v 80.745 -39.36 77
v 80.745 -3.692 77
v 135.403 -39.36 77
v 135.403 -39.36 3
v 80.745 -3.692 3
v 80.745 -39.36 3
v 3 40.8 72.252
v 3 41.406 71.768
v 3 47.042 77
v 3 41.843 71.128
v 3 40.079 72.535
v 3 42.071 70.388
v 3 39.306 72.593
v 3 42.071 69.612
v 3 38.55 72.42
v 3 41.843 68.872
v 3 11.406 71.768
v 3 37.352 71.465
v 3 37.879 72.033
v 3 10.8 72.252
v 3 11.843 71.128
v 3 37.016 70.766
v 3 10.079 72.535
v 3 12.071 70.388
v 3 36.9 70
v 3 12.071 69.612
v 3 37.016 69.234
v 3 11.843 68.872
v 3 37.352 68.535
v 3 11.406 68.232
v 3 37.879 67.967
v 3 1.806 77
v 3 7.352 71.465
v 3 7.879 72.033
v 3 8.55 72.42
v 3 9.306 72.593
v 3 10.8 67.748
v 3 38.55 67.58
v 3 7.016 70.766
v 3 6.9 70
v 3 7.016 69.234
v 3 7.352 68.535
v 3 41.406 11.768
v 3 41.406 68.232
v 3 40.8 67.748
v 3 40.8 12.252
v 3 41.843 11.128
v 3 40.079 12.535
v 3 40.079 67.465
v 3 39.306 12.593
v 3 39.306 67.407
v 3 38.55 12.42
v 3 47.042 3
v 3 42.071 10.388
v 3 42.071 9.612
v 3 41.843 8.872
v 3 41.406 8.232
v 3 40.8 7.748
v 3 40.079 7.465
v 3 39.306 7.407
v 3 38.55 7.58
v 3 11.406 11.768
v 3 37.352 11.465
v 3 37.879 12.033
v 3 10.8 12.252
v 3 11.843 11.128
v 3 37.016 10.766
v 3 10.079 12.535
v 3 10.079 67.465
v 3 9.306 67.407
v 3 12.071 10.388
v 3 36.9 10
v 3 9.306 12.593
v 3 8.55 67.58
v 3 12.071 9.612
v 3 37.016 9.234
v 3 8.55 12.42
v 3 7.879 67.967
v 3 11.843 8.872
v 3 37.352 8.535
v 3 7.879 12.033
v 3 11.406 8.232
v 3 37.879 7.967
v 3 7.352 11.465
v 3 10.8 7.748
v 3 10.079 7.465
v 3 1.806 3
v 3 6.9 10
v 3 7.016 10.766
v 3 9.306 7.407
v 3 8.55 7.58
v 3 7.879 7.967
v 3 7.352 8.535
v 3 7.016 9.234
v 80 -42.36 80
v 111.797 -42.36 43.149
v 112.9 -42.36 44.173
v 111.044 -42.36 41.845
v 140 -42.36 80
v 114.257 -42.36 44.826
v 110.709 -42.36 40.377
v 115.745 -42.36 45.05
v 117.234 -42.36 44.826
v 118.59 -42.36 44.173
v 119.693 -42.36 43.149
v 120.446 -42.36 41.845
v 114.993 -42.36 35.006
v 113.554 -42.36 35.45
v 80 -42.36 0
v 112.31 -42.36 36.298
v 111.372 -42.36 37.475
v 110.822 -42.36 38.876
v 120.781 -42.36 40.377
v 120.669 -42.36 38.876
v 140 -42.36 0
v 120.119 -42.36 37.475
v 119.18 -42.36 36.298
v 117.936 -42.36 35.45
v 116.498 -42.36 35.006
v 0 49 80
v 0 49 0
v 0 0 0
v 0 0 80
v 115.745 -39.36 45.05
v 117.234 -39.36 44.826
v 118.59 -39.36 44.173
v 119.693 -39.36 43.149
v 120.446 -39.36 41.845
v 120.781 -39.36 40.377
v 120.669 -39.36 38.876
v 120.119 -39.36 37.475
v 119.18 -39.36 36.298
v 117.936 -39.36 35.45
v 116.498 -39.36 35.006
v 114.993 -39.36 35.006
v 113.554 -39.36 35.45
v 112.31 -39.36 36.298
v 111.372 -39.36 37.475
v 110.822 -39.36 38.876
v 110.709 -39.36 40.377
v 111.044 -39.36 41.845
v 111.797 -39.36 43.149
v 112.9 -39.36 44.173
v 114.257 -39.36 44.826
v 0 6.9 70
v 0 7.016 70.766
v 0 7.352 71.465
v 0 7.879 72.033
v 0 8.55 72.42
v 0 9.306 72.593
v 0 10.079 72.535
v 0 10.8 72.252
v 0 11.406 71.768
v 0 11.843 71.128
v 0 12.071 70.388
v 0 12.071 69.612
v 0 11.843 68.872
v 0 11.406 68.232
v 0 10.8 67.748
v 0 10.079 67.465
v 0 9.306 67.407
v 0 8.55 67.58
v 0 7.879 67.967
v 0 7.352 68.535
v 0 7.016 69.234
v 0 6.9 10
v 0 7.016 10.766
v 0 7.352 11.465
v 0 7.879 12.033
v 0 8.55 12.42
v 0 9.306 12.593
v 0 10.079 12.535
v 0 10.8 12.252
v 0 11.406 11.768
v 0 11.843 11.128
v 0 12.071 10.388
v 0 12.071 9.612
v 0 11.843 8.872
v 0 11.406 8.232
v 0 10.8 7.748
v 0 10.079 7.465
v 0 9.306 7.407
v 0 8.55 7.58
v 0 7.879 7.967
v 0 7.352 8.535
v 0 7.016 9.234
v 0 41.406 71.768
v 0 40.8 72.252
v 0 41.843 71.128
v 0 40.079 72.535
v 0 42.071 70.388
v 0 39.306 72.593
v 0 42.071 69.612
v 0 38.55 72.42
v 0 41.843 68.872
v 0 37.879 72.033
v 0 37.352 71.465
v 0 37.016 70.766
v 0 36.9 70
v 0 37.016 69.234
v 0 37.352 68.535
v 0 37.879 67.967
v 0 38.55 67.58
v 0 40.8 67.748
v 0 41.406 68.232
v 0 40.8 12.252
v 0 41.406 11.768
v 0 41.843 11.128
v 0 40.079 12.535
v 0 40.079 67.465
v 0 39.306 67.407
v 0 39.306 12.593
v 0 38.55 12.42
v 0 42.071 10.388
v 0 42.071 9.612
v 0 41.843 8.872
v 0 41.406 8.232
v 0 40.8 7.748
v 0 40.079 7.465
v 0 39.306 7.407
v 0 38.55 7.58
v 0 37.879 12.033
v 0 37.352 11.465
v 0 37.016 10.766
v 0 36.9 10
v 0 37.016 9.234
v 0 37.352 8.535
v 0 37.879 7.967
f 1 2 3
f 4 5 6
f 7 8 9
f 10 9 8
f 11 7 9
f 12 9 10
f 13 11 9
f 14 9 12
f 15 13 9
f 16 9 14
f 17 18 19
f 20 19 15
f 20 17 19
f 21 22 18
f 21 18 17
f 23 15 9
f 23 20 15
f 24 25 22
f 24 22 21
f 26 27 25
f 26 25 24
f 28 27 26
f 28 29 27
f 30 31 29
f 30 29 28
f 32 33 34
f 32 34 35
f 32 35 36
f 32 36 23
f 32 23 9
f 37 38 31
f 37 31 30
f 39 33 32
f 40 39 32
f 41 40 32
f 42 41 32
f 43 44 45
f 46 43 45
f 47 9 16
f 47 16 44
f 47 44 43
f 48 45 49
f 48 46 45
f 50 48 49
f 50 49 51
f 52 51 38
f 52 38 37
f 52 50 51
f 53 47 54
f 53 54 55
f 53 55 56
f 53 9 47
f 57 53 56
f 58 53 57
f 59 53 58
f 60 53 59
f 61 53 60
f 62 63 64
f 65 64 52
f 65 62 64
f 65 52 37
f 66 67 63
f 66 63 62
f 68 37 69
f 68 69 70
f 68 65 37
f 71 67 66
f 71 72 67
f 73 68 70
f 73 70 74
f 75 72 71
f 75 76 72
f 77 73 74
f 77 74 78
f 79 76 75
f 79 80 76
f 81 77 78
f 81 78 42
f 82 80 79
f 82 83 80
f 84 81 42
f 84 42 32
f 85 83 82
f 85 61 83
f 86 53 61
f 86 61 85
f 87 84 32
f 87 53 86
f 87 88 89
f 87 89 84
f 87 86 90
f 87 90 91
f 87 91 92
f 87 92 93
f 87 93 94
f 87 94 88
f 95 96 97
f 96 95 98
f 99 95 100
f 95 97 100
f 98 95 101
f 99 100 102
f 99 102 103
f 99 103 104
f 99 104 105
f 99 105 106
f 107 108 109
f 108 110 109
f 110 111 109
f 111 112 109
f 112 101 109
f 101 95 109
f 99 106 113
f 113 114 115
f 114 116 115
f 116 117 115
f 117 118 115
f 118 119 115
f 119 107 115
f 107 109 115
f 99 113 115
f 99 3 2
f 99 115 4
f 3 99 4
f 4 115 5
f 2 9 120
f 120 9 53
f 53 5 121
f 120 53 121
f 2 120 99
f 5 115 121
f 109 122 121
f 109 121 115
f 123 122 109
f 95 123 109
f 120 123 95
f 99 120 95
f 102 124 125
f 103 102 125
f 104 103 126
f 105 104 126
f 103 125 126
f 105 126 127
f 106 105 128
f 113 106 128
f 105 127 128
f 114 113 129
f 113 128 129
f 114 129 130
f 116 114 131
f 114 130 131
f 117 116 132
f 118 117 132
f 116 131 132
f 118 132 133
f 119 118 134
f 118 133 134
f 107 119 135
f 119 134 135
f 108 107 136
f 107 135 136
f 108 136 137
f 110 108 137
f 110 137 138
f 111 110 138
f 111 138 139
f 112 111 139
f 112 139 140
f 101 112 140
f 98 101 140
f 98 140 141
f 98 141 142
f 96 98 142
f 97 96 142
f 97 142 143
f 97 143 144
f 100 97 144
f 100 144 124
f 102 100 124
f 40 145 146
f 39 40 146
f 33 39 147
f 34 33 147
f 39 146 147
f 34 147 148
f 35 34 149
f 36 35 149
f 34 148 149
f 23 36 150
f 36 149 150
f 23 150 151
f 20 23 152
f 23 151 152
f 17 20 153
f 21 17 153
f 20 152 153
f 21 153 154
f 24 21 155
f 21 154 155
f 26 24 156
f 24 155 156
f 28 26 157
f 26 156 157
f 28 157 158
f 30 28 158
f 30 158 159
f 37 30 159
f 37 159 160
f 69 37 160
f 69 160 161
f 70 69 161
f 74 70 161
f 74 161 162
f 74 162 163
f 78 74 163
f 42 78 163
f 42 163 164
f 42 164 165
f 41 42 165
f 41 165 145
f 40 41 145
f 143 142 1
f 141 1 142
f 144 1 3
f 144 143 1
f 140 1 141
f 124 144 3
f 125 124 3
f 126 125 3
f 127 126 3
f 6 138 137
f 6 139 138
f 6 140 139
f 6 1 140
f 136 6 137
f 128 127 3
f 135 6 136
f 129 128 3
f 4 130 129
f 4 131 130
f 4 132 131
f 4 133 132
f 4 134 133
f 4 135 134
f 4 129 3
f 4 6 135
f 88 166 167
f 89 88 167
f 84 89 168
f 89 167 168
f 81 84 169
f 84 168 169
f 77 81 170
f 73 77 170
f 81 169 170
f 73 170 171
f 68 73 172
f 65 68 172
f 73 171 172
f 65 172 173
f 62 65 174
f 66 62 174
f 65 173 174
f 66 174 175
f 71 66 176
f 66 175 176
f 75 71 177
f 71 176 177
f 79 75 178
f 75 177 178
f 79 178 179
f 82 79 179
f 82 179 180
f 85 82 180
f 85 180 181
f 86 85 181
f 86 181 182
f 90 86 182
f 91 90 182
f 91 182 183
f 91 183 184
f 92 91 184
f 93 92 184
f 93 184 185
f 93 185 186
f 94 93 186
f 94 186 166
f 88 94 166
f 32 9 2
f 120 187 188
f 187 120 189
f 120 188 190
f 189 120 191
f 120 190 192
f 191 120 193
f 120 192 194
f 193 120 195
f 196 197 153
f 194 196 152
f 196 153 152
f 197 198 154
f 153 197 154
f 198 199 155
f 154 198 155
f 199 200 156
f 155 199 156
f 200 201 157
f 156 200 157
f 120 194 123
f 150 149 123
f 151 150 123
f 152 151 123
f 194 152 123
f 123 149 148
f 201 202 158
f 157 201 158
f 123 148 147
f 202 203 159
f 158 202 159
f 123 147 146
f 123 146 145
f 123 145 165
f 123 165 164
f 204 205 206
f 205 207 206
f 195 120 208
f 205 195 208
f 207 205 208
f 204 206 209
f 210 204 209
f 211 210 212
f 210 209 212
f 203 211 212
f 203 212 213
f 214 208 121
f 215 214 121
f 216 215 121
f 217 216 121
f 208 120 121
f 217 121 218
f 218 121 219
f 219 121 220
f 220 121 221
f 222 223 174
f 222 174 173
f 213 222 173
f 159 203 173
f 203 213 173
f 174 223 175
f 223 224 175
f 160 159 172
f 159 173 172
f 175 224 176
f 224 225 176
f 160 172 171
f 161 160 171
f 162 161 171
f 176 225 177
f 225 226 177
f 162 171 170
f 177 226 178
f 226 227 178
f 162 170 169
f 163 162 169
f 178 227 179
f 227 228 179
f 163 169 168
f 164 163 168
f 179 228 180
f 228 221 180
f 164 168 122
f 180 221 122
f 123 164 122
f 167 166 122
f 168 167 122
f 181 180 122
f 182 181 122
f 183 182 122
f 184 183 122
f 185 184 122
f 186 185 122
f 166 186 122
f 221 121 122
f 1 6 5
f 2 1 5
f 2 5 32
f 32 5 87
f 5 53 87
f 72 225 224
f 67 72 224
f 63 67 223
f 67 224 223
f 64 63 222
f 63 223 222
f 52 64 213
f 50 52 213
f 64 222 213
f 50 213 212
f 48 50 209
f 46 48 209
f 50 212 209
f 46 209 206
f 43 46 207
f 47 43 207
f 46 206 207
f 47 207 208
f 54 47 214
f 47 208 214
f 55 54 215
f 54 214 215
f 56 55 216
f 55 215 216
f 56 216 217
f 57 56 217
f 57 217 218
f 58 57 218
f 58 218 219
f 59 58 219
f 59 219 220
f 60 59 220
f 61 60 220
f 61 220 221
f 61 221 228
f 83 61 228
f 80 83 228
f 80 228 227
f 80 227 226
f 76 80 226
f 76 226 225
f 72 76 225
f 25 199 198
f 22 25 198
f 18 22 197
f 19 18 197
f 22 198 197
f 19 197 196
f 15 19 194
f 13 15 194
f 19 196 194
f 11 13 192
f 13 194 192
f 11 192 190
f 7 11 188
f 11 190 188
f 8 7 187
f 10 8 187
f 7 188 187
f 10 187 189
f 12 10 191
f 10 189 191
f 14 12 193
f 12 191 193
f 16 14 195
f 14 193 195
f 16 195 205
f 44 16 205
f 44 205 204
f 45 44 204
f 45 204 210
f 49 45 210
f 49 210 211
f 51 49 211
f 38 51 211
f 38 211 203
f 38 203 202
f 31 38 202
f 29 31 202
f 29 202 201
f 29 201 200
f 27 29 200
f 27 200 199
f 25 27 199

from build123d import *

# Parameters (mm, degrees)
EXTRUDE_3_DEPTH     = 80
SHELL_14_T          = -3
CUT_EXTRUDE_1_REACH = 170.526
SKETCH_9_R          = 2.6
EXTRUDE_7_REACH     = 169.123
CUT_EXTRUDE_2_REACH = 185.868
SKETCH_24_R         = 5.05


with BuildPart() as part:
    # 草图5 → 凸台-拉伸3 (new body)
    with BuildSketch(Plane.XY):
        Polygon((0, 49), (0, 0), (80, -42.359693068), (140, -42.359693068), align=None)
    extrude(amount=EXTRUDE_3_DEPTH)

    # 抽壳14
    shell_14_openings = [part.faces().sort_by_distance(p)[0] for p in [
        (70, 3.320153466, 40),
    ]]
    offset(amount=SHELL_14_T, openings=shell_14_openings, kind=Kind.INTERSECTION)

    # 草图9 → 切除-拉伸1 (cut, up to next)
    with BuildSketch(Plane.ZY, mode=Mode.PRIVATE) as cut_extrude_1_sk1:
        with Locations(Location((70, 9.5, 0), (0, 0, 270))):
            Circle(SKETCH_9_R)
    cut_extrude_1_tool1 = extrude(cut_extrude_1_sk1.sketch, amount=-CUT_EXTRUDE_1_REACH, mode=Mode.PRIVATE) & part.part
    # 草图9 → 切除-拉伸1 (cut, up to next)
    with BuildSketch(Plane.ZY, mode=Mode.PRIVATE) as cut_extrude_1_sk2:
        with Locations(Location((70, 39.5, 0), (0, 0, 270))):
            Circle(SKETCH_9_R)
    cut_extrude_1_tool2 = extrude(cut_extrude_1_sk2.sketch, amount=-CUT_EXTRUDE_1_REACH, mode=Mode.PRIVATE) & part.part
    # 草图9 → 切除-拉伸1 (cut, up to next)
    with BuildSketch(Plane.ZY, mode=Mode.PRIVATE) as cut_extrude_1_sk3:
        with Locations(Location((10, 9.5, 0), (0, 0, 270))):
            Circle(SKETCH_9_R)
    cut_extrude_1_tool3 = extrude(cut_extrude_1_sk3.sketch, amount=-CUT_EXTRUDE_1_REACH, mode=Mode.PRIVATE) & part.part
    # 草图9 → 切除-拉伸1 (cut, up to next)
    with BuildSketch(Plane.ZY, mode=Mode.PRIVATE) as cut_extrude_1_sk4:
        with Locations(Location((10, 39.5, 0), (0, 0, 270))):
            Circle(SKETCH_9_R)
    cut_extrude_1_tool4 = extrude(cut_extrude_1_sk4.sketch, amount=-CUT_EXTRUDE_1_REACH, mode=Mode.PRIVATE) & part.part
    add(cut_extrude_1_tool1.solids().sort_by_distance((0, 9.5, 70))[0], mode=Mode.SUBTRACT)
    add(cut_extrude_1_tool2.solids().sort_by_distance((0, 39.5, 70))[0], mode=Mode.SUBTRACT)
    add(cut_extrude_1_tool3.solids().sort_by_distance((0, 9.5, 10))[0], mode=Mode.SUBTRACT)
    add(cut_extrude_1_tool4.solids().sort_by_distance((0, 39.5, 10))[0], mode=Mode.SUBTRACT)

    # 草图23 → 凸台-拉伸7 (add, up to next)
    with BuildSketch(Plane.XY.offset(3), mode=Mode.PRIVATE) as extrude_7_sk1:
        Polygon((80.745233001, -39.359693068), (80.745233001, -3.691855026), (3, 1.806109525), align=None)
    extrude_7_tool1 = extrude(extrude_7_sk1.sketch, amount=EXTRUDE_7_REACH, mode=Mode.PRIVATE) - part.part
    add(extrude_7_tool1.solids().sort_by_distance((54.830155, -13.74848, 3))[0])

    # 草图24 → 切除-拉伸2 (cut, up to next)
    with BuildSketch(Plane(origin=(0, -39.359693068, 0), x_dir=(1, 0, 0), z_dir=(0, 1, 0)), mode=Mode.PRIVATE) as cut_extrude_2_sk1:
        with Locations(Location((115.745233001, -40, 0), (0, 0, 270))):
            Circle(SKETCH_24_R)
    cut_extrude_2_tool1 = extrude(cut_extrude_2_sk1.sketch, amount=-CUT_EXTRUDE_2_REACH, mode=Mode.PRIVATE) & part.part
    add(cut_extrude_2_tool1.solids().sort_by_distance((115.745233, -39.359693, 40))[0], mode=Mode.SUBTRACT)


solid = part.part
